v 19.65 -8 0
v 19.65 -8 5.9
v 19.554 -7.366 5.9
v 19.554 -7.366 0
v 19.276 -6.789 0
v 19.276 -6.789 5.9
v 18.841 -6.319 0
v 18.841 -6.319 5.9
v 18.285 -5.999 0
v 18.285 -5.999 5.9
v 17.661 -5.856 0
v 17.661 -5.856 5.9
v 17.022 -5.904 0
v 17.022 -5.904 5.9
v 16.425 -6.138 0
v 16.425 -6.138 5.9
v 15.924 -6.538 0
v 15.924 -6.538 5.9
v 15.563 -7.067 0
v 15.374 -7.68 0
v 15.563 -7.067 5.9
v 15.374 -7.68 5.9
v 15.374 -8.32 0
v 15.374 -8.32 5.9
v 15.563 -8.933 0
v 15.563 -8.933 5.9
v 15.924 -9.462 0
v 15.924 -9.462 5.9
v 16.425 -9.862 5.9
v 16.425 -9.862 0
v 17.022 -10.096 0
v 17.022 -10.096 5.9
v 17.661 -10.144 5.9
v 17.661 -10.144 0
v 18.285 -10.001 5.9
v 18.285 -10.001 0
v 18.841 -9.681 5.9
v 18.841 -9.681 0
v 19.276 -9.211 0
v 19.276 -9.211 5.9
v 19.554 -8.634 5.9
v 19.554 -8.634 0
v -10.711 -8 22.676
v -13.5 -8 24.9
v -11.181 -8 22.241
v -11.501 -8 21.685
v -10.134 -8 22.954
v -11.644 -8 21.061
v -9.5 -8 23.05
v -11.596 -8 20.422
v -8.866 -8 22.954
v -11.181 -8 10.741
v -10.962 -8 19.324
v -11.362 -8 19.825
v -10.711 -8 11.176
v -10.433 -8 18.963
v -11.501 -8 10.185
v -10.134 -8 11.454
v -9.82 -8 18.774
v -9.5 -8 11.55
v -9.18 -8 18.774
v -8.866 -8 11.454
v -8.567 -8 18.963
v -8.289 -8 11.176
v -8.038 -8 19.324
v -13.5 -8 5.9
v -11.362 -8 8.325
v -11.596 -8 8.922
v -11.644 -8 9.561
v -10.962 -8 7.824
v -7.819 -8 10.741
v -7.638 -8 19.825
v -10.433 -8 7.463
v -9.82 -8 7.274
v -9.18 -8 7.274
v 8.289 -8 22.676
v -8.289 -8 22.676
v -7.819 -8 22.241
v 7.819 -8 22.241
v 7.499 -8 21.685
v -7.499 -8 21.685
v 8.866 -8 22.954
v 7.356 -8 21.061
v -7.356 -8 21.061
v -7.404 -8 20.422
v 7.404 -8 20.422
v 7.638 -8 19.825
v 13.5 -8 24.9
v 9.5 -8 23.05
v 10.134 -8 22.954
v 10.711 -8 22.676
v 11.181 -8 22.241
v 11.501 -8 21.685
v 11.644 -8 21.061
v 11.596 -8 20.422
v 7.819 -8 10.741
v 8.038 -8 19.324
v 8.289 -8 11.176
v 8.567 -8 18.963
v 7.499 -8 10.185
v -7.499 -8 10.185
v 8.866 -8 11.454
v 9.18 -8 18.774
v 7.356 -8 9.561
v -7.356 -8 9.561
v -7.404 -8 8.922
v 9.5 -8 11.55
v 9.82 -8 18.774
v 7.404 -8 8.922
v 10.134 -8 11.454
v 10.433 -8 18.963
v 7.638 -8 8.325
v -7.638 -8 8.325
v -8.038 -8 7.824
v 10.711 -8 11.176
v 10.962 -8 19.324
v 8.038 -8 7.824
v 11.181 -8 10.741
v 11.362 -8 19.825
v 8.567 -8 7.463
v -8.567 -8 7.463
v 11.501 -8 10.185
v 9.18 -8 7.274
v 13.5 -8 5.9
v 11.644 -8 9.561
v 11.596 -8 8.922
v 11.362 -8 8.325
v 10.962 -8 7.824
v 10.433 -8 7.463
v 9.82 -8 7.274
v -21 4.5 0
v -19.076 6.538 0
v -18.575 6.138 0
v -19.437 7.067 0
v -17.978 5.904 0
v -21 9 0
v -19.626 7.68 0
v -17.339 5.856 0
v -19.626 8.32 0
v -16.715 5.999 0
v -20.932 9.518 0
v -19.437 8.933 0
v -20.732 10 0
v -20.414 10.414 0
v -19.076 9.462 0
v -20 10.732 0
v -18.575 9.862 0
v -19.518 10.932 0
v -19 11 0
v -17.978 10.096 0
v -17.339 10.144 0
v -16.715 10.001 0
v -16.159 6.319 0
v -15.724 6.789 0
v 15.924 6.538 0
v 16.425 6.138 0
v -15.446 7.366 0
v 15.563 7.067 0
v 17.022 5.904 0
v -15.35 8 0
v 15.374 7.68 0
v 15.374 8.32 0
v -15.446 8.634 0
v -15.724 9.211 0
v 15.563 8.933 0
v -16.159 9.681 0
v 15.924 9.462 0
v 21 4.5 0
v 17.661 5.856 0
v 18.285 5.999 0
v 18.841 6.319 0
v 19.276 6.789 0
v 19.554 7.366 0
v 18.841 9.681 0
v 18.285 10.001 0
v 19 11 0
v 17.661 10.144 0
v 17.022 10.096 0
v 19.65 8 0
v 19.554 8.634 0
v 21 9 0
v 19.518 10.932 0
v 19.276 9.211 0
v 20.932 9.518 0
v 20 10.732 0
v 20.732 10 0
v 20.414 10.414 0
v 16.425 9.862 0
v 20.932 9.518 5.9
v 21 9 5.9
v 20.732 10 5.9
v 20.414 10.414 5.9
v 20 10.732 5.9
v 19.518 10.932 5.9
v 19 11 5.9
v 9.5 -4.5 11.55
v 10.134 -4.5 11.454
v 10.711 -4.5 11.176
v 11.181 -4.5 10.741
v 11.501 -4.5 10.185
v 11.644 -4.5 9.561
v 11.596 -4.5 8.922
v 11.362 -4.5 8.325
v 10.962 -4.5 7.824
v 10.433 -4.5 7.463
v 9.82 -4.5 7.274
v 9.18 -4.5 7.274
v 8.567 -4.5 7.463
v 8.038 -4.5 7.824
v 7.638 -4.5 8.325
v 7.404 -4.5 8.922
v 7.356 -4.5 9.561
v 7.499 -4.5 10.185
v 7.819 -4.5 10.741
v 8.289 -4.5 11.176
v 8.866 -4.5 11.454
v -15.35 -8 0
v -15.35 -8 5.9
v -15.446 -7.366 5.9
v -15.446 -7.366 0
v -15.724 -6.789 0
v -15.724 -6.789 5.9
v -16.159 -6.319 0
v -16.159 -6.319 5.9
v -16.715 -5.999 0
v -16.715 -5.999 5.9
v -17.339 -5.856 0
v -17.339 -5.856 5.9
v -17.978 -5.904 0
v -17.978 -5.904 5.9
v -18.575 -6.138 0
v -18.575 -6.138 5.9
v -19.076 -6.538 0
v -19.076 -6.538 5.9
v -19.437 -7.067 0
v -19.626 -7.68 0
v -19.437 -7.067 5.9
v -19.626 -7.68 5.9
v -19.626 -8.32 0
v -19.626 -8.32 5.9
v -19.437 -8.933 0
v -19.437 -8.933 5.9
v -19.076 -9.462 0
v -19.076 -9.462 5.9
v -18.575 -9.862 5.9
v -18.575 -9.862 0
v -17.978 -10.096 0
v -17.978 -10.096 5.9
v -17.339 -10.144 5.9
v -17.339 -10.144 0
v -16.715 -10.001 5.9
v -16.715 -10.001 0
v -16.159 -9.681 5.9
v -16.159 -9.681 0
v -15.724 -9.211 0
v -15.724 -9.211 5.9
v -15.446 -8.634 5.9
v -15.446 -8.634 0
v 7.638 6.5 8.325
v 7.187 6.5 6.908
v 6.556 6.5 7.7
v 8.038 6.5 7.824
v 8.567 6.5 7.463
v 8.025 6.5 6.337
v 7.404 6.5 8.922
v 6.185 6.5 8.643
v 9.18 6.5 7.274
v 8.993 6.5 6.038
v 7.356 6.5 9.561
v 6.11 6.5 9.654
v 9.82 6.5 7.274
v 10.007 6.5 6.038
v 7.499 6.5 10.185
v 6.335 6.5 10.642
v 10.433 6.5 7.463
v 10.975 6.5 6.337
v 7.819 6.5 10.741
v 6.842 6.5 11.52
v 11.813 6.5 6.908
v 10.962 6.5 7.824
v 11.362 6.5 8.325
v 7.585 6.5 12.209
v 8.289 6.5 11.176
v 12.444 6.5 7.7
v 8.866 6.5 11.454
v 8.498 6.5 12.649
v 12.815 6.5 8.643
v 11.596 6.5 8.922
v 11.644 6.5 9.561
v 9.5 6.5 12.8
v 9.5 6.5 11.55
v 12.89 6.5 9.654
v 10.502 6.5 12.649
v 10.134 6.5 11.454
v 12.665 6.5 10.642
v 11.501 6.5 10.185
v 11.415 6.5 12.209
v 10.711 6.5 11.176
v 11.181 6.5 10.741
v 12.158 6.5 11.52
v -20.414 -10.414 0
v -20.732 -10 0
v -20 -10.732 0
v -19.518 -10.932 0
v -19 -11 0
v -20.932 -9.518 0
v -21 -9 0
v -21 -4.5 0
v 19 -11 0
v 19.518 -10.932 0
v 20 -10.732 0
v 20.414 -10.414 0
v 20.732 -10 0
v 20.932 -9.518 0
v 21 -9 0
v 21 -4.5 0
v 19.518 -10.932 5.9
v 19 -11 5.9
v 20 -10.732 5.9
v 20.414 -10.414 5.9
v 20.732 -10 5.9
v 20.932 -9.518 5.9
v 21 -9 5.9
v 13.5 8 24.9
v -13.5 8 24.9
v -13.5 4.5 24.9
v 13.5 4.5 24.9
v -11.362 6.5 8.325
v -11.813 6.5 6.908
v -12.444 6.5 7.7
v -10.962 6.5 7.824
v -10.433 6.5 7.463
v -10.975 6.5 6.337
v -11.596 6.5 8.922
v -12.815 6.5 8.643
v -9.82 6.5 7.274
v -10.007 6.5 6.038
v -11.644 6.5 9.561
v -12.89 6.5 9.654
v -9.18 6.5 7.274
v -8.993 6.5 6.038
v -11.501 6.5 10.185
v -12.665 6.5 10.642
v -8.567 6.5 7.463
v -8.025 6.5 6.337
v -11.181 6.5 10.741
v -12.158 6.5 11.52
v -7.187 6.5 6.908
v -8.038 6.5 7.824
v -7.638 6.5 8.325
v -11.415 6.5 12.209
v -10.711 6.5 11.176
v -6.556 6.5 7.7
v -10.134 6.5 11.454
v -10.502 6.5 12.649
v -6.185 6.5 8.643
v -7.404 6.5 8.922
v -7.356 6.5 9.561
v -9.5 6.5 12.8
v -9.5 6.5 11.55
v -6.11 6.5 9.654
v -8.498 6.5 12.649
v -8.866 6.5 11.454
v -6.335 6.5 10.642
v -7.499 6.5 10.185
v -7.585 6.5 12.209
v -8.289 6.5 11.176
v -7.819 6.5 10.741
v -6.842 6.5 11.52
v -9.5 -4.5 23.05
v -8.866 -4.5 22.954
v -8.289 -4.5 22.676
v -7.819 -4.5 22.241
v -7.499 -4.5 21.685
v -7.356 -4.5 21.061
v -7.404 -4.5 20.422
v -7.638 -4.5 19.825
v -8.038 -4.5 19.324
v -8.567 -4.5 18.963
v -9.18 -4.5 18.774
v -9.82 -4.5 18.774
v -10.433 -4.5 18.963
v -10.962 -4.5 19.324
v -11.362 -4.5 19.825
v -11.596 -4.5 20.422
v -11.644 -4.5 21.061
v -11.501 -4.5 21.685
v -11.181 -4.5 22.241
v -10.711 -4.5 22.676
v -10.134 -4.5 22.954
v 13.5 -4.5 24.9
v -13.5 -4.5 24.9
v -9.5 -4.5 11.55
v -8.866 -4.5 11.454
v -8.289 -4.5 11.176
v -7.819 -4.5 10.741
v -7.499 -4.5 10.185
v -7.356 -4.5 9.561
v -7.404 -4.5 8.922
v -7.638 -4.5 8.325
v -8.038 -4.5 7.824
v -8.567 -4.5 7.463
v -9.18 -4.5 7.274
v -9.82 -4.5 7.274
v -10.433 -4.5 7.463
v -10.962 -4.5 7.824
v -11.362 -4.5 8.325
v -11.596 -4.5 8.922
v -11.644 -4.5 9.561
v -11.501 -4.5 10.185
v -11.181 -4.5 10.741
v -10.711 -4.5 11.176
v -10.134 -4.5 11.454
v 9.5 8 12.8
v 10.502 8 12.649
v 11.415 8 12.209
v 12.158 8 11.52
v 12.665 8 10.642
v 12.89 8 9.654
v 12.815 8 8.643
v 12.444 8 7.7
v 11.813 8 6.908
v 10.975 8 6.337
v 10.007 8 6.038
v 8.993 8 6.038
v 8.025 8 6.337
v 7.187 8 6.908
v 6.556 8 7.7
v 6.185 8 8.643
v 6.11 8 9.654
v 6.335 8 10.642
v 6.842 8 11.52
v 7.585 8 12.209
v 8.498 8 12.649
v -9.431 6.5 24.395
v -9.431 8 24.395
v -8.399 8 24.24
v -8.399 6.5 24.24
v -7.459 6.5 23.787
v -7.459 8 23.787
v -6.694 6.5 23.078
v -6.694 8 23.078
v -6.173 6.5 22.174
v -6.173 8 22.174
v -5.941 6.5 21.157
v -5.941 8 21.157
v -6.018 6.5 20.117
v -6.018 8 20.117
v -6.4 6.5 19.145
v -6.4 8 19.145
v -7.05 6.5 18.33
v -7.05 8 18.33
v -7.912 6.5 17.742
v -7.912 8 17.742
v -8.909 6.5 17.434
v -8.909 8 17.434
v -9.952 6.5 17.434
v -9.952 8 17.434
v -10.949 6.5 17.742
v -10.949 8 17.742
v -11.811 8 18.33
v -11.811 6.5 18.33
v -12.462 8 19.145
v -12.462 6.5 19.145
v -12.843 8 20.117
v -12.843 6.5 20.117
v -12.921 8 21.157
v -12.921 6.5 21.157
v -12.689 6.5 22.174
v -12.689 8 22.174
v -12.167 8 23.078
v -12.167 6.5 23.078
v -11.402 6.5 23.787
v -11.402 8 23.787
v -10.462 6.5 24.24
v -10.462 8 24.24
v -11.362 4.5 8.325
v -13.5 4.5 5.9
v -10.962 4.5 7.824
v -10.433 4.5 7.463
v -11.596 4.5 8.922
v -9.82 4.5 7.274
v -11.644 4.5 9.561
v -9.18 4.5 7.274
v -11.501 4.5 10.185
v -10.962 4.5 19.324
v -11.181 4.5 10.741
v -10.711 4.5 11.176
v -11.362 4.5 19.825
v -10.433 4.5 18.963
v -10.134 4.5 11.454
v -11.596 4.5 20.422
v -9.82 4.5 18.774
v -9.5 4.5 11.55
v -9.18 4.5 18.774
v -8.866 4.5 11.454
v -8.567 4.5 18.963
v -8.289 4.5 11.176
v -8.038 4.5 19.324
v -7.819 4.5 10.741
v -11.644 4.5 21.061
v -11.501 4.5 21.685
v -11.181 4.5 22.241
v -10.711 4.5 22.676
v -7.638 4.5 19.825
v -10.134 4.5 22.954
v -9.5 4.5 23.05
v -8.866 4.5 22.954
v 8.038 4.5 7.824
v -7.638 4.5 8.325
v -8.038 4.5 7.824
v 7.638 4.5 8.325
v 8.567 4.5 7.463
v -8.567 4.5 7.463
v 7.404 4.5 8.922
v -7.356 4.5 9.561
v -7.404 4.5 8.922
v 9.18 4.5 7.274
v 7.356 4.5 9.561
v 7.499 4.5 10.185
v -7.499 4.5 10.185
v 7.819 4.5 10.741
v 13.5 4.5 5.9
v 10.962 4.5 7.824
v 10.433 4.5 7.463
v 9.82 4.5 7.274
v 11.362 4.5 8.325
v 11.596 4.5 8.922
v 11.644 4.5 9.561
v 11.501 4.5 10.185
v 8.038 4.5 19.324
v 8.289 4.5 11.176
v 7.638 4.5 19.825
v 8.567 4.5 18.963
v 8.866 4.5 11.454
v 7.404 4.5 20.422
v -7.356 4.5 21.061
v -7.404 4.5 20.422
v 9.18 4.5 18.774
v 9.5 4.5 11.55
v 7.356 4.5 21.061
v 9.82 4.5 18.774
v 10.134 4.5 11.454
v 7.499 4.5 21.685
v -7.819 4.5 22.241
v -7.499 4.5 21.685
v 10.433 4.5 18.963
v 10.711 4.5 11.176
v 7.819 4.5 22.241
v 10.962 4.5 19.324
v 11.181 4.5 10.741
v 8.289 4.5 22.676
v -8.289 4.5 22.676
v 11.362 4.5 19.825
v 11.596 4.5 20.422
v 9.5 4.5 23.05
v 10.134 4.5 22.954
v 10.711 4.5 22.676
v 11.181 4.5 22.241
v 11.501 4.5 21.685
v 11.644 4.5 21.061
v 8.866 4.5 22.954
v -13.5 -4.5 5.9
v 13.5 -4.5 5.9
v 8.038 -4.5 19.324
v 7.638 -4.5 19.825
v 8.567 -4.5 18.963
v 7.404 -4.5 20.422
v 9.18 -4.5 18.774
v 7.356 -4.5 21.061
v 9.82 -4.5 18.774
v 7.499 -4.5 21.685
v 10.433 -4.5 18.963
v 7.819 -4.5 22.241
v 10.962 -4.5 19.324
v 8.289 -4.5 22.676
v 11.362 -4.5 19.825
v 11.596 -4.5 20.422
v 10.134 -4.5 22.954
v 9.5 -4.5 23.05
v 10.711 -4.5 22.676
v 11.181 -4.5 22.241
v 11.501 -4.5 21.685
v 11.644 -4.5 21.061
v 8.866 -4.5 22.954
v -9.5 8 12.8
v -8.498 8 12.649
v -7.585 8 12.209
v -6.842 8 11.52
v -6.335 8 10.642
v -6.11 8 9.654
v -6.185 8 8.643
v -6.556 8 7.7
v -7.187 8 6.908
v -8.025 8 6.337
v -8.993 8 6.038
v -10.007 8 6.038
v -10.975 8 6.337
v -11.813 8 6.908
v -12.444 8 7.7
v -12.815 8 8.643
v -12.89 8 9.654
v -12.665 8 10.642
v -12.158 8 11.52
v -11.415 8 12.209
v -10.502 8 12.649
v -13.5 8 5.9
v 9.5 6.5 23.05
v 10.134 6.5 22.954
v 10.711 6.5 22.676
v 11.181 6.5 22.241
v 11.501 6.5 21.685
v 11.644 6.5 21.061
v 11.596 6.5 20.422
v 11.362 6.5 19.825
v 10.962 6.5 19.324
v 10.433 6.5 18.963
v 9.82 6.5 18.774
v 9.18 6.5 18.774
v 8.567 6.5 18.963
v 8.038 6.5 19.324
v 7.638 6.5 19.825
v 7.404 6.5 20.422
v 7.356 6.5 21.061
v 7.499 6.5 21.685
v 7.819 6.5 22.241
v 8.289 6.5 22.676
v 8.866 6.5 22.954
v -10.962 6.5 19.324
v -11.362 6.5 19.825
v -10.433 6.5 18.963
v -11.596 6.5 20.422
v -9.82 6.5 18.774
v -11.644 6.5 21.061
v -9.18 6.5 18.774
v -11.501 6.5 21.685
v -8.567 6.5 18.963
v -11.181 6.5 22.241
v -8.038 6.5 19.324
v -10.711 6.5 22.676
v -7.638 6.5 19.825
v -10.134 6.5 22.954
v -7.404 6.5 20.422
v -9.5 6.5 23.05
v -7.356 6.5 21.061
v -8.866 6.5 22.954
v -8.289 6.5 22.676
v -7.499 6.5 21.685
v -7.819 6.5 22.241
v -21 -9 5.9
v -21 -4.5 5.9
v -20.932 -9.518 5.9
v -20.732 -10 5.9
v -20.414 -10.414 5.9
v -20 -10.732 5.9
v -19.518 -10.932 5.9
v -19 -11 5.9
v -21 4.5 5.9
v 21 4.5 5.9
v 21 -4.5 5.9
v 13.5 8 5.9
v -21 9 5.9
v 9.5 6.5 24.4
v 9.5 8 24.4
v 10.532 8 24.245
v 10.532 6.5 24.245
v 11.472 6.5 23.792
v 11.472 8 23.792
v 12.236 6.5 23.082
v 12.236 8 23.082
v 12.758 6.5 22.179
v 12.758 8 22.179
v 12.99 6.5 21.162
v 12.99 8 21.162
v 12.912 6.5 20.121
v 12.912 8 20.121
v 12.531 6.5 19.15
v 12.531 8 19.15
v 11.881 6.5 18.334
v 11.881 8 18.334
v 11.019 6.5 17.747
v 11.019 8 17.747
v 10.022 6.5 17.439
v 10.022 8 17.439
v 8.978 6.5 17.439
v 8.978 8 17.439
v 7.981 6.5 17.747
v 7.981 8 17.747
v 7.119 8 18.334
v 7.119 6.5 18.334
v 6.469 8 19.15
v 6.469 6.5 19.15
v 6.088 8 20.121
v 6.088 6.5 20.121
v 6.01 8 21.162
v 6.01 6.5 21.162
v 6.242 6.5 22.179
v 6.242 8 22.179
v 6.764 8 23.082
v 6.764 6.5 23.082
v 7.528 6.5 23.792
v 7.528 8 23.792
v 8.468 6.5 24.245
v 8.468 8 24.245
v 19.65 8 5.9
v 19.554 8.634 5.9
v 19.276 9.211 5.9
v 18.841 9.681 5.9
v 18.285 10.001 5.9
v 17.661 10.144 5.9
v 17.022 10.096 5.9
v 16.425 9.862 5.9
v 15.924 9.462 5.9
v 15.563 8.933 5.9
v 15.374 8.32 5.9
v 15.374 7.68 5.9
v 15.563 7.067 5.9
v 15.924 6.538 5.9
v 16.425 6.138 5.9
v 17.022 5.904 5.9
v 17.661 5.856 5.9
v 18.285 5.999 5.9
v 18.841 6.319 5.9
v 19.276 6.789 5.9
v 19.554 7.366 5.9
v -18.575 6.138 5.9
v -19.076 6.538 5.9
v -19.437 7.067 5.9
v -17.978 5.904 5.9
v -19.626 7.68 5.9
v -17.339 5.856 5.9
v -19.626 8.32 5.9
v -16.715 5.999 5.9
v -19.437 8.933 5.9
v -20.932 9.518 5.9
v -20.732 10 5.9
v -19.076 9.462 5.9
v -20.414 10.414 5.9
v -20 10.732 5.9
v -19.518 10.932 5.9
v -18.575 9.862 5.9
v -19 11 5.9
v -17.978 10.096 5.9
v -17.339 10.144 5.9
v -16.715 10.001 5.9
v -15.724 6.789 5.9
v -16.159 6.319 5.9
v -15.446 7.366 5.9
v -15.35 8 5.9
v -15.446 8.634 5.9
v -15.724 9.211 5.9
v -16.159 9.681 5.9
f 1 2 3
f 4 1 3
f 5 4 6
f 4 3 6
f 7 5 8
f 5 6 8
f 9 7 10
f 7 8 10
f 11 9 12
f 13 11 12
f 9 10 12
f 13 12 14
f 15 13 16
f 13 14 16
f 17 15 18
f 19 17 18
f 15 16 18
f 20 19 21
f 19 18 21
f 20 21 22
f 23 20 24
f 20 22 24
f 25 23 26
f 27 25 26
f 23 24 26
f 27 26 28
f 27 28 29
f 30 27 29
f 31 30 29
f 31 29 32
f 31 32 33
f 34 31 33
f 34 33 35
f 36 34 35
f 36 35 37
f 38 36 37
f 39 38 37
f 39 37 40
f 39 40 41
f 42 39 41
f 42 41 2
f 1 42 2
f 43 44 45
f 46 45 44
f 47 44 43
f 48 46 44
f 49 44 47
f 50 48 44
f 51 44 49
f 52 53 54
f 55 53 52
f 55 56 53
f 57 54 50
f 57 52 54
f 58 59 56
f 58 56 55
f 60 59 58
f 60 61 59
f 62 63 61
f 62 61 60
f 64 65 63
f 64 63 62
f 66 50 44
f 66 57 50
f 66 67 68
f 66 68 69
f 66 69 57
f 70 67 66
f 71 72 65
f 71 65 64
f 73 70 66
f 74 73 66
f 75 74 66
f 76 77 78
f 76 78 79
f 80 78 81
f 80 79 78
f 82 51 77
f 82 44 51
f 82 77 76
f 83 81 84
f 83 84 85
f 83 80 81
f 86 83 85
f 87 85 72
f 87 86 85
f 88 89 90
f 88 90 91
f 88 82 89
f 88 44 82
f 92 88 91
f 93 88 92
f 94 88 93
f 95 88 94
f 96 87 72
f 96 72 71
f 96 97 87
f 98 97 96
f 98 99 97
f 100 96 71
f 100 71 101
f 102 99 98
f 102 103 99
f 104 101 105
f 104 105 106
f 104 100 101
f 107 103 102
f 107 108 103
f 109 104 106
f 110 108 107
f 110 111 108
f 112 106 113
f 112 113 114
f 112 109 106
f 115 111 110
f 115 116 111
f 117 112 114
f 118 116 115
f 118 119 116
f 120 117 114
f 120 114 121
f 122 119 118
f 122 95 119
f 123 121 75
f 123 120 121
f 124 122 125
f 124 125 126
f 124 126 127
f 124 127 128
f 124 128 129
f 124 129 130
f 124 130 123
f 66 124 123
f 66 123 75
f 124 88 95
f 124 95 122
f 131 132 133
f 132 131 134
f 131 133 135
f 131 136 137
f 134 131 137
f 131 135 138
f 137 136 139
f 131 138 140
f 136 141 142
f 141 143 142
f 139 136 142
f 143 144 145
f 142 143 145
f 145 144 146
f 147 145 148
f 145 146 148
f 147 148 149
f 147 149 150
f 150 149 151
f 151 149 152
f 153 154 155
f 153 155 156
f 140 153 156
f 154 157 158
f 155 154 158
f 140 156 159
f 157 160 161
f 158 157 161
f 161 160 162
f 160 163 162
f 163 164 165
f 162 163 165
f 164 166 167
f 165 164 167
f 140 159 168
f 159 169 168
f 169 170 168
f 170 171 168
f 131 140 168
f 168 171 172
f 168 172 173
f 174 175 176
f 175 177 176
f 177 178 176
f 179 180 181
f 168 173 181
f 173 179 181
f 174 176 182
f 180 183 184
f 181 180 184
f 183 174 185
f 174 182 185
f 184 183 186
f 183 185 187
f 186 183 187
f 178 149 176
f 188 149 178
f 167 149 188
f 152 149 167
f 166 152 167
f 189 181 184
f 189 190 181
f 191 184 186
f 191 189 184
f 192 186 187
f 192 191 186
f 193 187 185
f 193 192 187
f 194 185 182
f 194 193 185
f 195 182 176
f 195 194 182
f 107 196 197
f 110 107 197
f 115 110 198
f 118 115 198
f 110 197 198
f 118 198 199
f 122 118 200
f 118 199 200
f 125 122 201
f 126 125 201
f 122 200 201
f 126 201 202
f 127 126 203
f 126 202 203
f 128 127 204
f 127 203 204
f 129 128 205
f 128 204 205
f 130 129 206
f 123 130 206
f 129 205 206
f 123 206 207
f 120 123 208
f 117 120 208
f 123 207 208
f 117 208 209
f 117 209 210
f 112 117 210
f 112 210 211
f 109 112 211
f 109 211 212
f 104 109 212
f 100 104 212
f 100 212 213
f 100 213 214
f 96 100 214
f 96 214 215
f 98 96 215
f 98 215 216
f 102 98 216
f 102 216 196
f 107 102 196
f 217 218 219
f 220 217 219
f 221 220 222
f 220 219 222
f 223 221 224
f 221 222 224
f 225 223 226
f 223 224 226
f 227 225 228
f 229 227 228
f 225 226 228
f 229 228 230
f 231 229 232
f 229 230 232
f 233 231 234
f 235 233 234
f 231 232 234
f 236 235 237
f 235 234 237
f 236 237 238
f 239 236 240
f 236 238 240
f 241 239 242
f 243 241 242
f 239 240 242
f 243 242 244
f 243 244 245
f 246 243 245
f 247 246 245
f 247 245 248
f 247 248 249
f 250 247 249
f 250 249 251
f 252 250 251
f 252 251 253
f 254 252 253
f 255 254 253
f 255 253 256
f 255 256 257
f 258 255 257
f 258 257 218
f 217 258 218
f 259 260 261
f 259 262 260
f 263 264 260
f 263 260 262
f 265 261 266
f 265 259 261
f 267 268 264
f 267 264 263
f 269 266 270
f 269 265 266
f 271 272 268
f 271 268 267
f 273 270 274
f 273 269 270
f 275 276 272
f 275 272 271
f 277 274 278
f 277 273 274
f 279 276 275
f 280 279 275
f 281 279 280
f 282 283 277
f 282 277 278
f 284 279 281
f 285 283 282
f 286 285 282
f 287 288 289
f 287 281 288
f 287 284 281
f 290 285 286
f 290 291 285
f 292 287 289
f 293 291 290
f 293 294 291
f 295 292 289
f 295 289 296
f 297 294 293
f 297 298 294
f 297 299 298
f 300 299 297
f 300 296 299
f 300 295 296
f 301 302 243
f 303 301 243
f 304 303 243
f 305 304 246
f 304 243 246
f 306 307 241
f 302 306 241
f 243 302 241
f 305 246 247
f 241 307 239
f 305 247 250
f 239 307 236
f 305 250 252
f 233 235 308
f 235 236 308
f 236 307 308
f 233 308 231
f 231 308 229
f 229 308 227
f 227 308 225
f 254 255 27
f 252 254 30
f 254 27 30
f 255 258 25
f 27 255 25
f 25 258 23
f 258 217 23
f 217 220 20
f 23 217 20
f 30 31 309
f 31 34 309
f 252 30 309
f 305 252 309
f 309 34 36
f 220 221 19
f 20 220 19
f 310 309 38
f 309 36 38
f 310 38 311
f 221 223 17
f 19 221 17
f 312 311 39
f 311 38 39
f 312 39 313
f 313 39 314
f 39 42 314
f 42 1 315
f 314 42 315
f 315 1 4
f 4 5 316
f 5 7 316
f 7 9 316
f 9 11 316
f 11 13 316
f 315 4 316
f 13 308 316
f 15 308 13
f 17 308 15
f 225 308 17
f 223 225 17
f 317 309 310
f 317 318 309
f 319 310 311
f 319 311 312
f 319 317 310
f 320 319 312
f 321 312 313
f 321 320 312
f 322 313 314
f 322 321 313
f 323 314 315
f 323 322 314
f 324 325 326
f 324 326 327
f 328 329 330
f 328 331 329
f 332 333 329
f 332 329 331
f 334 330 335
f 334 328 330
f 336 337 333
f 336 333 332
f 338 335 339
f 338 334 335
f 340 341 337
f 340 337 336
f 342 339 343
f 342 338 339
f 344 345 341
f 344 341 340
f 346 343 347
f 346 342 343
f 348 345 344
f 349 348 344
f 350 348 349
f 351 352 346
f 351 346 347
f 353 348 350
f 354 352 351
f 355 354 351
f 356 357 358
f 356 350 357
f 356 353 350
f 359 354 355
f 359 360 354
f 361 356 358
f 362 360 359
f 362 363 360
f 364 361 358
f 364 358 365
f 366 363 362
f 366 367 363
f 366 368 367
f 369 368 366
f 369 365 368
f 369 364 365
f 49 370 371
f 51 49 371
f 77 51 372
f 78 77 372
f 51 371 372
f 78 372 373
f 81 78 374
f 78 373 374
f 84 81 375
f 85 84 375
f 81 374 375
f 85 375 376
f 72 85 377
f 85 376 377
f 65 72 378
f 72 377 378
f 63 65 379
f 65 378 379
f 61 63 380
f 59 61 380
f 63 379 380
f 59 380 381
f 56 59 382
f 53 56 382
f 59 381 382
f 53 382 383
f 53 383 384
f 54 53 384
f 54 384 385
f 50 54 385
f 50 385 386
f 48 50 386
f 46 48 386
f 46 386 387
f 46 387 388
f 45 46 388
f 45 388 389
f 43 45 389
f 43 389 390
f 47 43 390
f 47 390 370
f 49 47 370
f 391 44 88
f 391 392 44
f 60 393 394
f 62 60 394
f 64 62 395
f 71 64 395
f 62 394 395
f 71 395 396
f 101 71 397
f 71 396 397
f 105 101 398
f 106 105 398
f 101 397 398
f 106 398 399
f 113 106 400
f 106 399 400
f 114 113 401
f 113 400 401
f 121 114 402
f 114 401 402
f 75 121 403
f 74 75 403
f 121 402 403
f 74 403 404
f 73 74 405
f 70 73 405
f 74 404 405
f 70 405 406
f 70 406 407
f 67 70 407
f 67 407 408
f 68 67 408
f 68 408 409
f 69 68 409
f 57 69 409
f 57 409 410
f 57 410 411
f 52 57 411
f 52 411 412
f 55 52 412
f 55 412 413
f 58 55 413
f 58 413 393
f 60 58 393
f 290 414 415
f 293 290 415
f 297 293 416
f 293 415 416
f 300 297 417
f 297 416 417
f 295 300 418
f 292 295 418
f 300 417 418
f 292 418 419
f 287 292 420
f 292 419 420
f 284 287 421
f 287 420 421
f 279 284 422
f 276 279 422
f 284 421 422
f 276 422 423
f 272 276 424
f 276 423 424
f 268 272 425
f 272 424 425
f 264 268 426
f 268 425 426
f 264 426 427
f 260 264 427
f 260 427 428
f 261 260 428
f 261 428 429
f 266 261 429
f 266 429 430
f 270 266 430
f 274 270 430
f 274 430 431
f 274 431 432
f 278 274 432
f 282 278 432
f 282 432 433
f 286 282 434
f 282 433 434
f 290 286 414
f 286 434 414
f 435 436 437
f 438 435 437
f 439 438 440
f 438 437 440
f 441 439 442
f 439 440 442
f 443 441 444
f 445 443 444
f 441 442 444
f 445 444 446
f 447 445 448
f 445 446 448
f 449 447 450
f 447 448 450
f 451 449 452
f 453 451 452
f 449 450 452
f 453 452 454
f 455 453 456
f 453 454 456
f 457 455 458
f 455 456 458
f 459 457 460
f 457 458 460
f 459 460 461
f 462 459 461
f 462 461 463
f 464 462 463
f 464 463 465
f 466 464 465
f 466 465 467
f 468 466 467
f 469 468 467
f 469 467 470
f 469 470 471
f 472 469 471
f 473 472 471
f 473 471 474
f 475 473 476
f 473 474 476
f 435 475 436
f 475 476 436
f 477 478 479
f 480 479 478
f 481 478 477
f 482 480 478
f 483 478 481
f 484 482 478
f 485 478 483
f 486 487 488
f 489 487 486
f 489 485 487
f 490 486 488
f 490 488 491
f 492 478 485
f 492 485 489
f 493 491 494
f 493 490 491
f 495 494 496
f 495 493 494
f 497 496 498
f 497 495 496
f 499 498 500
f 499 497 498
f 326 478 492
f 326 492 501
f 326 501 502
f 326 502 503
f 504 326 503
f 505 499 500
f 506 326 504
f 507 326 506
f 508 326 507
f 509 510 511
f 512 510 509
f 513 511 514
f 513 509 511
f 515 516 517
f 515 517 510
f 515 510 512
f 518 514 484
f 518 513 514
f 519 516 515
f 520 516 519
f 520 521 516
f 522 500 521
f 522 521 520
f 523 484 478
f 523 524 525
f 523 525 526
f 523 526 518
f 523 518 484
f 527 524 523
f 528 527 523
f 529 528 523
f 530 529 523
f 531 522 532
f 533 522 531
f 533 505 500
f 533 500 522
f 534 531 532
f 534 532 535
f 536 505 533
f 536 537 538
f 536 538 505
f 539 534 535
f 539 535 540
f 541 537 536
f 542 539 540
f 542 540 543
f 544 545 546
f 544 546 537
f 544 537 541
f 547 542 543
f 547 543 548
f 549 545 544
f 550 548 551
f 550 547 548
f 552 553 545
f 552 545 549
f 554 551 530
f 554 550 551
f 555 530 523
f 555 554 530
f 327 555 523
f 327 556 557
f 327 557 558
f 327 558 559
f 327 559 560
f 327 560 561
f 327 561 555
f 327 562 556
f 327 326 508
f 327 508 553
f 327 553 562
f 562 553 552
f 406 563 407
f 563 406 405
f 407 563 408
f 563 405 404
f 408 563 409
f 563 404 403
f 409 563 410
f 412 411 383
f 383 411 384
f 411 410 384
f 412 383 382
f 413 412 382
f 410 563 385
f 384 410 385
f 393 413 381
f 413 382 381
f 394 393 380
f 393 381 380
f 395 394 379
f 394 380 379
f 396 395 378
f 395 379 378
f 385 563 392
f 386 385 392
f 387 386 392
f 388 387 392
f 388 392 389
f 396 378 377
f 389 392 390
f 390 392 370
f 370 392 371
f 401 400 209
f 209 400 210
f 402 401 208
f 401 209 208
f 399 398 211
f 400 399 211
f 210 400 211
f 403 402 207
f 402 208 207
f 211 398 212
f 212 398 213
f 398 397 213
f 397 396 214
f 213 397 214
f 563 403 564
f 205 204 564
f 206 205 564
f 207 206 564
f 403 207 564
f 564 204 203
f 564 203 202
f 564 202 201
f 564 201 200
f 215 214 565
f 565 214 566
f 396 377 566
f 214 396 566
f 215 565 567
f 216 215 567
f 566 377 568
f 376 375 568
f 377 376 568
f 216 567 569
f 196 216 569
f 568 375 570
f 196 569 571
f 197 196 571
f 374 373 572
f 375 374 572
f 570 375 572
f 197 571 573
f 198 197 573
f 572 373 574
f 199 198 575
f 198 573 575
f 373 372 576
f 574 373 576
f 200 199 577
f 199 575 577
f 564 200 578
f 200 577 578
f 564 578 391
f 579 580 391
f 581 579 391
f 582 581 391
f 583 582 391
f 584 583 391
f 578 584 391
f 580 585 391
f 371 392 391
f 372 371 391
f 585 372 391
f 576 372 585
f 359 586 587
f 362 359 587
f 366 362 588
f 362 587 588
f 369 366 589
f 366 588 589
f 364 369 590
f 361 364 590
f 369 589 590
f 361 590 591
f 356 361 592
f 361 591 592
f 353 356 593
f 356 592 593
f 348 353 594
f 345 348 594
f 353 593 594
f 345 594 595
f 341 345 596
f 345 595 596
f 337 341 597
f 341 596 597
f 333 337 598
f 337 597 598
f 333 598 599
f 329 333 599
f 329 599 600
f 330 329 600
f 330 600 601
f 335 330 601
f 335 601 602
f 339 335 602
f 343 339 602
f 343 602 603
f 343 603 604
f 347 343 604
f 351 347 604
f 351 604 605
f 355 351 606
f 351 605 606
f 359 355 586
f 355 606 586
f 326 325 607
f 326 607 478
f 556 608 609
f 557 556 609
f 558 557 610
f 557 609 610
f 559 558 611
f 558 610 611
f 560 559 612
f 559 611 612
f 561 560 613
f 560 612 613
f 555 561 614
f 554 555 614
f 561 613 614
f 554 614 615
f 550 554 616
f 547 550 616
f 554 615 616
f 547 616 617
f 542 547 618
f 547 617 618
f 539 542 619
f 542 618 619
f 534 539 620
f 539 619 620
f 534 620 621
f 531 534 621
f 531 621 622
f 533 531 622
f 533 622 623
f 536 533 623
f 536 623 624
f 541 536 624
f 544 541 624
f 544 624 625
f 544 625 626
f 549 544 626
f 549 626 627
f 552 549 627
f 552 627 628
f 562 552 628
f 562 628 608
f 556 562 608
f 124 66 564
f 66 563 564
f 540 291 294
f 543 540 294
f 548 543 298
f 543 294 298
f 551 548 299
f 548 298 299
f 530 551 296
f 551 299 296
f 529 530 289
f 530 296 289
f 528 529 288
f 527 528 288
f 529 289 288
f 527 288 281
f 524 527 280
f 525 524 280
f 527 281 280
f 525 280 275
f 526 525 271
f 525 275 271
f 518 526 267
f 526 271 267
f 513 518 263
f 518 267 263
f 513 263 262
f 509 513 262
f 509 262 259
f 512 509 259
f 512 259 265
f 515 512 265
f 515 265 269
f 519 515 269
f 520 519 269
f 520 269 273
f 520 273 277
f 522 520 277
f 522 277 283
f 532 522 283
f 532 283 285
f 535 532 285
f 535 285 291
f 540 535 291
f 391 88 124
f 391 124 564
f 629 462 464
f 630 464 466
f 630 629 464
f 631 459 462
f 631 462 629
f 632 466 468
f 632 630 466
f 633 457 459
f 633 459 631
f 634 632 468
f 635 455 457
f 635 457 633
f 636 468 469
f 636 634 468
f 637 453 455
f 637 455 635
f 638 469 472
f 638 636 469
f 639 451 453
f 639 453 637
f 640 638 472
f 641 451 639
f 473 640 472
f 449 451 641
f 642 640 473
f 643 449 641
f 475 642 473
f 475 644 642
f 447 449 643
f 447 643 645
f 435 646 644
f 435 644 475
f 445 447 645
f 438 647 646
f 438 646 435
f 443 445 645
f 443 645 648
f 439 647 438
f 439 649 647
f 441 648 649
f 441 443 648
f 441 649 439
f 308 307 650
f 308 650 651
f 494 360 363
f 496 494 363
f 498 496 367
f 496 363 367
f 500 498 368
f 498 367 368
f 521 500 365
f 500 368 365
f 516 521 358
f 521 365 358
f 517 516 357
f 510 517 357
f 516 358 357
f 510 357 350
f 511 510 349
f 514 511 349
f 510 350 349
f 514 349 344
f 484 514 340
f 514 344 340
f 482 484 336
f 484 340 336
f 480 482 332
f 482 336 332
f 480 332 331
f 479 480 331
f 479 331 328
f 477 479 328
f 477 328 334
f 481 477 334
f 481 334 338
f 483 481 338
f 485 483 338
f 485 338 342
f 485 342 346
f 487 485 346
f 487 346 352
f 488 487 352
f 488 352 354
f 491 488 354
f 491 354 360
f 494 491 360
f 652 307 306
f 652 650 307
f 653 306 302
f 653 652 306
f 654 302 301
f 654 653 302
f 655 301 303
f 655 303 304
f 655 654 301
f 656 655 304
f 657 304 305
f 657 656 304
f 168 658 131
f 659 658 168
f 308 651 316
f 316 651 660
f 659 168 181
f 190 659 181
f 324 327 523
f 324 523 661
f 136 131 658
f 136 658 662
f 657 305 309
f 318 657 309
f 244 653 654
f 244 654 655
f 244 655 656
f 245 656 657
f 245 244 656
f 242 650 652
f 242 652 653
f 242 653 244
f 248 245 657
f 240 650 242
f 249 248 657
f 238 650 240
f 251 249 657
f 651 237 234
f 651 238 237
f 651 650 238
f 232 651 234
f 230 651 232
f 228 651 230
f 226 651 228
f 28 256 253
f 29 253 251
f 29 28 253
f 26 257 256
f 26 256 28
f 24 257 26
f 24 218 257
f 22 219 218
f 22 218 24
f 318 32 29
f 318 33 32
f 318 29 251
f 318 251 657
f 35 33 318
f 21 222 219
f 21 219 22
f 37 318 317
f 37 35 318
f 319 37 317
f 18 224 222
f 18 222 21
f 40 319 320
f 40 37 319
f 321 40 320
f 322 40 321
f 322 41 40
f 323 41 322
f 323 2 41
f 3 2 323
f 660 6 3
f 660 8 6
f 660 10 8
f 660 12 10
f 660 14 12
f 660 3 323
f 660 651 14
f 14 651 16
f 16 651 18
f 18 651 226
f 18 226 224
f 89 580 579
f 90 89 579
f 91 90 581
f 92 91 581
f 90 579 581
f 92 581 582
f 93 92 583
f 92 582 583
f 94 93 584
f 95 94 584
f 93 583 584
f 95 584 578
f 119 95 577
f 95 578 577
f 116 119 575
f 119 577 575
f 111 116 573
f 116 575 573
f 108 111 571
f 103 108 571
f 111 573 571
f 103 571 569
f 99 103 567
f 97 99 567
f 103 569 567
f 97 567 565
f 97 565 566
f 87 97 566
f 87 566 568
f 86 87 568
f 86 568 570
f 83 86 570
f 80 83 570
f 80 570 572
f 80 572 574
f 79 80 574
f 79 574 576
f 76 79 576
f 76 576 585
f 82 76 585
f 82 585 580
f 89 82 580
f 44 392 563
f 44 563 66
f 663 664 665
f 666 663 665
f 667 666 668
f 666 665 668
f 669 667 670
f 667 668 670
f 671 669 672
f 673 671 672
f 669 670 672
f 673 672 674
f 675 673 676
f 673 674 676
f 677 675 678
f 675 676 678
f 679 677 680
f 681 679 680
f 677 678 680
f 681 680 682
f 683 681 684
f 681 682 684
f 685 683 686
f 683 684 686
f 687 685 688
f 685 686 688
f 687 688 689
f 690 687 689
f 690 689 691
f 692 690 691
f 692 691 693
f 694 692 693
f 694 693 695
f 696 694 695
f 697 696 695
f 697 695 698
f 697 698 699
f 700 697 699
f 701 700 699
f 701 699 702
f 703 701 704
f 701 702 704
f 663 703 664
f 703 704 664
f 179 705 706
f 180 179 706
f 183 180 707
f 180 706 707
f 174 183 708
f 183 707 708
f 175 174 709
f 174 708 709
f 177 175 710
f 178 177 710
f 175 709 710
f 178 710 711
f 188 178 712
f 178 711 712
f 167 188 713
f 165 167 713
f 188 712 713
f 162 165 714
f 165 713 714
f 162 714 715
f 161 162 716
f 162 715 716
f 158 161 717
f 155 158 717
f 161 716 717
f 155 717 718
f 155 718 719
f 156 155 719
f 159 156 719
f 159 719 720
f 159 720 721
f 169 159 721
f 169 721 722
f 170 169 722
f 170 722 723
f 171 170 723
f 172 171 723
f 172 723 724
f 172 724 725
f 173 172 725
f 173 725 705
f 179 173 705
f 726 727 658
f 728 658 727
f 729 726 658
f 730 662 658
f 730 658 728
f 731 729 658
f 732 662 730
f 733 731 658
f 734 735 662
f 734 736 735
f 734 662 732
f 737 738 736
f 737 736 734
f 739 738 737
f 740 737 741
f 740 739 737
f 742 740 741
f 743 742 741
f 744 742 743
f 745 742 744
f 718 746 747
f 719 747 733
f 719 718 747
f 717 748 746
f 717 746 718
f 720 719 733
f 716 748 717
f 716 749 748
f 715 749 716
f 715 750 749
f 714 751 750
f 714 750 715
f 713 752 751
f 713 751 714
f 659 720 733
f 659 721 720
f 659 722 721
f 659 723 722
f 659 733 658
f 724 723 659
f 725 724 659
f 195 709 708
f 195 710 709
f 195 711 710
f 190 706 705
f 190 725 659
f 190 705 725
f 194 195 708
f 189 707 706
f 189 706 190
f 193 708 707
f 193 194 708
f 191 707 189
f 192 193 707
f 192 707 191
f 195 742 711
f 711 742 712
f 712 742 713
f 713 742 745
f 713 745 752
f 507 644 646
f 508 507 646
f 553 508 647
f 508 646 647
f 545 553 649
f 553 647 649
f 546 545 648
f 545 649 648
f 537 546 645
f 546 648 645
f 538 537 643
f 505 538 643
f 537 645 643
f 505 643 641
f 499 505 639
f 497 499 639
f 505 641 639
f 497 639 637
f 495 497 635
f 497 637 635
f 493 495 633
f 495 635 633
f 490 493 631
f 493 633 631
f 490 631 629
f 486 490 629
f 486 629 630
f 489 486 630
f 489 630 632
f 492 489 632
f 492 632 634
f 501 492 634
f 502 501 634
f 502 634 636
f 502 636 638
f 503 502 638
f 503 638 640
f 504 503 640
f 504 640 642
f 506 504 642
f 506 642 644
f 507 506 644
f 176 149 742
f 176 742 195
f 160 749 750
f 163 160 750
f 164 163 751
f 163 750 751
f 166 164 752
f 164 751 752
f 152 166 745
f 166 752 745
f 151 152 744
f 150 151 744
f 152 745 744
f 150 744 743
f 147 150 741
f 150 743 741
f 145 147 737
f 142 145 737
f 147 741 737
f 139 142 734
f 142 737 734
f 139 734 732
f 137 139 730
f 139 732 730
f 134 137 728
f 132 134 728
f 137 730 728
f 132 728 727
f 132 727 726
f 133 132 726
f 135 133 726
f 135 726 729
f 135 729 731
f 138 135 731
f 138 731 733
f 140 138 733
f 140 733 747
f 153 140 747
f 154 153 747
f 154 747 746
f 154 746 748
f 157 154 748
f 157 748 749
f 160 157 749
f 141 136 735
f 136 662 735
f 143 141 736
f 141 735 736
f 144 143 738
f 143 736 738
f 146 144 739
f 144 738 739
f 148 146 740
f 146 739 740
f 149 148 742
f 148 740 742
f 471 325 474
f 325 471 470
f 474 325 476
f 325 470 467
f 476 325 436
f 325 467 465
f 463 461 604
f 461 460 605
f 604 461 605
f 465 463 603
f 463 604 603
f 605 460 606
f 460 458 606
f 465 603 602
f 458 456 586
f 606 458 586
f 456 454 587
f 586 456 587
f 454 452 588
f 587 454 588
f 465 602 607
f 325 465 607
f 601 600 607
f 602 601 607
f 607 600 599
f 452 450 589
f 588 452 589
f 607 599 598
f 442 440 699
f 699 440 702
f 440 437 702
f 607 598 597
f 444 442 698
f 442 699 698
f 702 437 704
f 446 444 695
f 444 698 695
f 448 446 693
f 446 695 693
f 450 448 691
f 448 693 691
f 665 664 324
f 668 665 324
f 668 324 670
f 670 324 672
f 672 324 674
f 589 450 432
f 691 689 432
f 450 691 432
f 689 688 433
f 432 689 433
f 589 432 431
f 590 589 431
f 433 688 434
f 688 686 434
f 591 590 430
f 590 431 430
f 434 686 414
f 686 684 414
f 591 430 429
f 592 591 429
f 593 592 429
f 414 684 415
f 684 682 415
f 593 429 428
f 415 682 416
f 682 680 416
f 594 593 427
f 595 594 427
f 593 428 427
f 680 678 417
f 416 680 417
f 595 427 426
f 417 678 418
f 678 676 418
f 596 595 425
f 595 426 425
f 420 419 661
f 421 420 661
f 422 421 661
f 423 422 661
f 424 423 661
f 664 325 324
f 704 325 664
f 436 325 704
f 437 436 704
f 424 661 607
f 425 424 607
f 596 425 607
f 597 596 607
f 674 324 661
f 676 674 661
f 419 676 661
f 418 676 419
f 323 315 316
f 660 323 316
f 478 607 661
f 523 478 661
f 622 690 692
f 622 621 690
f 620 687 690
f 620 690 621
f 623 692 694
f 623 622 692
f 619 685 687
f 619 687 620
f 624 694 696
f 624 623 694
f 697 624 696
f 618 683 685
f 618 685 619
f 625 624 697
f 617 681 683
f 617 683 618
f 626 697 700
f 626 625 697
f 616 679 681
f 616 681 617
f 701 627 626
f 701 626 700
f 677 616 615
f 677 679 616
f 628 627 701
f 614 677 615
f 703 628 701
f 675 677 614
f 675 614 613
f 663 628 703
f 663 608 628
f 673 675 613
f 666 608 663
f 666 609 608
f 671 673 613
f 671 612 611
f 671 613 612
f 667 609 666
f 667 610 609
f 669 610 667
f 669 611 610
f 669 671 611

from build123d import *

# Parameters (mm, degrees)
SKETCH_1_W           = 42
SKETCH_1_H           = 22
EXTRUDE_1_DEPTH      = 5.9
FILLET_1_R           = 2
SKETCH_2_R           = 2.15
CUT_EXTRUDE_1_DEPTH  = 10
EXTRUDE_2_DEPTH      = 19
SKETCH_4_W           = 42
SKETCH_4_H           = 9
CUT_EXTRUDE_6_DEPTH  = 24.9
SKETCH_6_W           = 19
SKETCH_6_H           = 3
CUT_EXTRUDE_7_DEPTH  = 27
SKETCH_7_R           = 2.15
CUT_EXTRUDE_8_DEPTH  = 50
SKETCH_8_R           = 3.4
SKETCH_8_R_2         = 3.5
CUT_EXTRUDE_11_DEPTH = 1.5


with BuildPart() as part:
    # 草图1 → 凸台-拉伸1 (new body)
    with BuildSketch(Plane.XY):
        Rectangle(SKETCH_1_W, SKETCH_1_H)
    extrude(amount=EXTRUDE_1_DEPTH)

    # 圆角1
    fillet_1_edges = [part.edges().sort_by_distance(p)[0] for p in [
        (21, -11, 2.95),
        (-21, -11, 2.95),
        (-21, 11, 2.95),
        (21, 11, 2.95),
    ]]
    fillet(fillet_1_edges, radius=FILLET_1_R)

    # 草图2 → 切除-拉伸1 (cut)
    with BuildSketch(Plane.XY.offset(5.9)):
        with Locations((17.5, 8)):
            Circle(SKETCH_2_R)
        with Locations((-17.5, 8)):
            Circle(SKETCH_2_R)
        with Locations((17.5, -8)):
            Circle(SKETCH_2_R)
        with Locations((-17.5, -8)):
            Circle(SKETCH_2_R)
    extrude(amount=-CUT_EXTRUDE_1_DEPTH, mode=Mode.SUBTRACT)


with BuildPart() as body_2:
    # 草图3 → 凸台-拉伸2 (new body)
    with BuildSketch(Plane(origin=(0, 0, 24.9), x_dir=(-1, 0, 0), z_dir=(0, 0, -1))):
        Polygon((-21, -4.5), (-21, 4.5), (-13.5, 4.5), (-13.5, 11), (13.5, 11), (13.5, 4.5), (21, 4.5), (21, -4.5), (13.5, -4.5), (13.5, -11), (-13.5, -11), (-13.5, -4.5), align=None)
    extrude(amount=EXTRUDE_2_DEPTH)


with BuildPart() as cut_extrude_6_tool:
    # 草图4 → 切除-拉伸6 (new body)
    with BuildSketch(Plane.XY.offset(24.9)):
        Rectangle(SKETCH_4_W, SKETCH_4_H)
    extrude(amount=-CUT_EXTRUDE_6_DEPTH)


with BuildPart() as part_1:
    add(part.part)

    # 切除-拉伸6: cut by cut_extrude_6_tool
    add(cut_extrude_6_tool.part, mode=Mode.SUBTRACT)


with BuildPart() as body_2_1:
    add(body_2.part)

    # 切除-拉伸6: cut by cut_extrude_6_tool
    add(cut_extrude_6_tool.part, mode=Mode.SUBTRACT)


with BuildPart() as cut_extrude_6_piece_1:
    # of the separate pieces the step leaves, piece 1, a body of its own (cut_extrude_6_pieces)
    add(part_1.part.solids().sort_by_distance((-19, 11, 0))[0])


with BuildPart() as cut_extrude_6_piece_2:
    # of the separate pieces the step leaves, piece 2, a body of its own (cut_extrude_6_pieces)
    add(part_1.part.solids().sort_by_distance((-21, -9, 0))[0])


with BuildPart() as cut_extrude_6_piece_1_of_body_2:
    # of the separate pieces the step leaves, piece 1, a body of its own (cut_extrude_6_pieces_of_body_2)
    add(body_2_1.part.solids().sort_by_distance((13.5, 4.5, 24.9))[0])


with BuildPart() as cut_extrude_6_piece_2_of_body_2:
    # of the separate pieces the step leaves, piece 2, a body of its own (cut_extrude_6_pieces_of_body_2)
    add(body_2_1.part.solids().sort_by_distance((13.5, -11, 24.9))[0])


with BuildPart() as cut_extrude_7_tool:
    # 草图6 → 切除-拉伸7 (new body)
    with BuildSketch(Plane(origin=(13.5, 0, 0), x_dir=(0, 0, -1), z_dir=(1, 0, 0))):
        with Locations((-15.4, 9.5)):
            Rectangle(SKETCH_6_W, SKETCH_6_H)
        with Locations((-15.4, -9.5)):
            Rectangle(SKETCH_6_W, SKETCH_6_H)
    extrude(amount=-CUT_EXTRUDE_7_DEPTH)


with BuildPart() as cut_extrude_6_piece_1_of_body_2_1:
    add(cut_extrude_6_piece_1_of_body_2.part)

    # 切除-拉伸7: cut by cut_extrude_7_tool
    add(cut_extrude_7_tool.part, mode=Mode.SUBTRACT)


with BuildPart() as cut_extrude_6_piece_2_of_body_2_1:
    add(cut_extrude_6_piece_2_of_body_2.part)

    # 切除-拉伸7: cut by cut_extrude_7_tool
    add(cut_extrude_7_tool.part, mode=Mode.SUBTRACT)


with BuildPart() as cut_extrude_8_tool:
    # 草图7 → 切除-拉伸8 (new body)
    with BuildSketch(Plane(origin=(0, 8, 0), x_dir=(1, 0, 0), z_dir=(0, 1, 0))):
        with Locations(Location((-9.5, -9.4, 0), (0, 0, 270))):
            Circle(SKETCH_7_R)
        with Locations(Location((9.5, -9.4, 0), (0, 0, 270))):
            Circle(SKETCH_7_R)
        with Locations(Location((-9.5, -20.9, 0), (0, 0, 270))):
            Circle(SKETCH_7_R)
        with Locations(Location((9.5, -20.9, 0), (0, 0, 270))):
            Circle(SKETCH_7_R)
    extrude(amount=-CUT_EXTRUDE_8_DEPTH)


with BuildPart() as cut_extrude_6_piece_1_of_body_2_2:
    add(cut_extrude_6_piece_1_of_body_2_1.part)

    # 切除-拉伸8: cut by cut_extrude_8_tool
    add(cut_extrude_8_tool.part, mode=Mode.SUBTRACT)

    # 草图8 → 切除-拉伸11 (cut)
    with BuildSketch(Plane(origin=(0, 8, 0), x_dir=(1, 0, 0), z_dir=(0, 1, 0))):
        with Locations(Location((-9.5, -9.4, 0), (0, 0, 270))):
            Circle(SKETCH_8_R)
        with Locations(Location((9.5, -9.4, 0), (0, 0, 270))):
            Circle(SKETCH_8_R)
        with Locations(Location((-9.430716155, -20.89534369, 0), (0, 0, 270))):
            Circle(SKETCH_8_R_2)
        with Locations(Location((9.5, -20.9, 0), (0, 0, 270))):
            Circle(SKETCH_8_R_2)
    extrude(amount=-CUT_EXTRUDE_11_DEPTH, mode=Mode.SUBTRACT)


with BuildPart() as cut_extrude_6_piece_2_of_body_2_2:
    add(cut_extrude_6_piece_2_of_body_2_1.part)

    # 切除-拉伸8: cut by cut_extrude_8_tool
    add(cut_extrude_8_tool.part, mode=Mode.SUBTRACT)


solid = Compound([cut_extrude_6_piece_1.part, cut_extrude_6_piece_2.part, cut_extrude_6_piece_1_of_body_2_2.part, cut_extrude_6_piece_2_of_body_2_2.part])
